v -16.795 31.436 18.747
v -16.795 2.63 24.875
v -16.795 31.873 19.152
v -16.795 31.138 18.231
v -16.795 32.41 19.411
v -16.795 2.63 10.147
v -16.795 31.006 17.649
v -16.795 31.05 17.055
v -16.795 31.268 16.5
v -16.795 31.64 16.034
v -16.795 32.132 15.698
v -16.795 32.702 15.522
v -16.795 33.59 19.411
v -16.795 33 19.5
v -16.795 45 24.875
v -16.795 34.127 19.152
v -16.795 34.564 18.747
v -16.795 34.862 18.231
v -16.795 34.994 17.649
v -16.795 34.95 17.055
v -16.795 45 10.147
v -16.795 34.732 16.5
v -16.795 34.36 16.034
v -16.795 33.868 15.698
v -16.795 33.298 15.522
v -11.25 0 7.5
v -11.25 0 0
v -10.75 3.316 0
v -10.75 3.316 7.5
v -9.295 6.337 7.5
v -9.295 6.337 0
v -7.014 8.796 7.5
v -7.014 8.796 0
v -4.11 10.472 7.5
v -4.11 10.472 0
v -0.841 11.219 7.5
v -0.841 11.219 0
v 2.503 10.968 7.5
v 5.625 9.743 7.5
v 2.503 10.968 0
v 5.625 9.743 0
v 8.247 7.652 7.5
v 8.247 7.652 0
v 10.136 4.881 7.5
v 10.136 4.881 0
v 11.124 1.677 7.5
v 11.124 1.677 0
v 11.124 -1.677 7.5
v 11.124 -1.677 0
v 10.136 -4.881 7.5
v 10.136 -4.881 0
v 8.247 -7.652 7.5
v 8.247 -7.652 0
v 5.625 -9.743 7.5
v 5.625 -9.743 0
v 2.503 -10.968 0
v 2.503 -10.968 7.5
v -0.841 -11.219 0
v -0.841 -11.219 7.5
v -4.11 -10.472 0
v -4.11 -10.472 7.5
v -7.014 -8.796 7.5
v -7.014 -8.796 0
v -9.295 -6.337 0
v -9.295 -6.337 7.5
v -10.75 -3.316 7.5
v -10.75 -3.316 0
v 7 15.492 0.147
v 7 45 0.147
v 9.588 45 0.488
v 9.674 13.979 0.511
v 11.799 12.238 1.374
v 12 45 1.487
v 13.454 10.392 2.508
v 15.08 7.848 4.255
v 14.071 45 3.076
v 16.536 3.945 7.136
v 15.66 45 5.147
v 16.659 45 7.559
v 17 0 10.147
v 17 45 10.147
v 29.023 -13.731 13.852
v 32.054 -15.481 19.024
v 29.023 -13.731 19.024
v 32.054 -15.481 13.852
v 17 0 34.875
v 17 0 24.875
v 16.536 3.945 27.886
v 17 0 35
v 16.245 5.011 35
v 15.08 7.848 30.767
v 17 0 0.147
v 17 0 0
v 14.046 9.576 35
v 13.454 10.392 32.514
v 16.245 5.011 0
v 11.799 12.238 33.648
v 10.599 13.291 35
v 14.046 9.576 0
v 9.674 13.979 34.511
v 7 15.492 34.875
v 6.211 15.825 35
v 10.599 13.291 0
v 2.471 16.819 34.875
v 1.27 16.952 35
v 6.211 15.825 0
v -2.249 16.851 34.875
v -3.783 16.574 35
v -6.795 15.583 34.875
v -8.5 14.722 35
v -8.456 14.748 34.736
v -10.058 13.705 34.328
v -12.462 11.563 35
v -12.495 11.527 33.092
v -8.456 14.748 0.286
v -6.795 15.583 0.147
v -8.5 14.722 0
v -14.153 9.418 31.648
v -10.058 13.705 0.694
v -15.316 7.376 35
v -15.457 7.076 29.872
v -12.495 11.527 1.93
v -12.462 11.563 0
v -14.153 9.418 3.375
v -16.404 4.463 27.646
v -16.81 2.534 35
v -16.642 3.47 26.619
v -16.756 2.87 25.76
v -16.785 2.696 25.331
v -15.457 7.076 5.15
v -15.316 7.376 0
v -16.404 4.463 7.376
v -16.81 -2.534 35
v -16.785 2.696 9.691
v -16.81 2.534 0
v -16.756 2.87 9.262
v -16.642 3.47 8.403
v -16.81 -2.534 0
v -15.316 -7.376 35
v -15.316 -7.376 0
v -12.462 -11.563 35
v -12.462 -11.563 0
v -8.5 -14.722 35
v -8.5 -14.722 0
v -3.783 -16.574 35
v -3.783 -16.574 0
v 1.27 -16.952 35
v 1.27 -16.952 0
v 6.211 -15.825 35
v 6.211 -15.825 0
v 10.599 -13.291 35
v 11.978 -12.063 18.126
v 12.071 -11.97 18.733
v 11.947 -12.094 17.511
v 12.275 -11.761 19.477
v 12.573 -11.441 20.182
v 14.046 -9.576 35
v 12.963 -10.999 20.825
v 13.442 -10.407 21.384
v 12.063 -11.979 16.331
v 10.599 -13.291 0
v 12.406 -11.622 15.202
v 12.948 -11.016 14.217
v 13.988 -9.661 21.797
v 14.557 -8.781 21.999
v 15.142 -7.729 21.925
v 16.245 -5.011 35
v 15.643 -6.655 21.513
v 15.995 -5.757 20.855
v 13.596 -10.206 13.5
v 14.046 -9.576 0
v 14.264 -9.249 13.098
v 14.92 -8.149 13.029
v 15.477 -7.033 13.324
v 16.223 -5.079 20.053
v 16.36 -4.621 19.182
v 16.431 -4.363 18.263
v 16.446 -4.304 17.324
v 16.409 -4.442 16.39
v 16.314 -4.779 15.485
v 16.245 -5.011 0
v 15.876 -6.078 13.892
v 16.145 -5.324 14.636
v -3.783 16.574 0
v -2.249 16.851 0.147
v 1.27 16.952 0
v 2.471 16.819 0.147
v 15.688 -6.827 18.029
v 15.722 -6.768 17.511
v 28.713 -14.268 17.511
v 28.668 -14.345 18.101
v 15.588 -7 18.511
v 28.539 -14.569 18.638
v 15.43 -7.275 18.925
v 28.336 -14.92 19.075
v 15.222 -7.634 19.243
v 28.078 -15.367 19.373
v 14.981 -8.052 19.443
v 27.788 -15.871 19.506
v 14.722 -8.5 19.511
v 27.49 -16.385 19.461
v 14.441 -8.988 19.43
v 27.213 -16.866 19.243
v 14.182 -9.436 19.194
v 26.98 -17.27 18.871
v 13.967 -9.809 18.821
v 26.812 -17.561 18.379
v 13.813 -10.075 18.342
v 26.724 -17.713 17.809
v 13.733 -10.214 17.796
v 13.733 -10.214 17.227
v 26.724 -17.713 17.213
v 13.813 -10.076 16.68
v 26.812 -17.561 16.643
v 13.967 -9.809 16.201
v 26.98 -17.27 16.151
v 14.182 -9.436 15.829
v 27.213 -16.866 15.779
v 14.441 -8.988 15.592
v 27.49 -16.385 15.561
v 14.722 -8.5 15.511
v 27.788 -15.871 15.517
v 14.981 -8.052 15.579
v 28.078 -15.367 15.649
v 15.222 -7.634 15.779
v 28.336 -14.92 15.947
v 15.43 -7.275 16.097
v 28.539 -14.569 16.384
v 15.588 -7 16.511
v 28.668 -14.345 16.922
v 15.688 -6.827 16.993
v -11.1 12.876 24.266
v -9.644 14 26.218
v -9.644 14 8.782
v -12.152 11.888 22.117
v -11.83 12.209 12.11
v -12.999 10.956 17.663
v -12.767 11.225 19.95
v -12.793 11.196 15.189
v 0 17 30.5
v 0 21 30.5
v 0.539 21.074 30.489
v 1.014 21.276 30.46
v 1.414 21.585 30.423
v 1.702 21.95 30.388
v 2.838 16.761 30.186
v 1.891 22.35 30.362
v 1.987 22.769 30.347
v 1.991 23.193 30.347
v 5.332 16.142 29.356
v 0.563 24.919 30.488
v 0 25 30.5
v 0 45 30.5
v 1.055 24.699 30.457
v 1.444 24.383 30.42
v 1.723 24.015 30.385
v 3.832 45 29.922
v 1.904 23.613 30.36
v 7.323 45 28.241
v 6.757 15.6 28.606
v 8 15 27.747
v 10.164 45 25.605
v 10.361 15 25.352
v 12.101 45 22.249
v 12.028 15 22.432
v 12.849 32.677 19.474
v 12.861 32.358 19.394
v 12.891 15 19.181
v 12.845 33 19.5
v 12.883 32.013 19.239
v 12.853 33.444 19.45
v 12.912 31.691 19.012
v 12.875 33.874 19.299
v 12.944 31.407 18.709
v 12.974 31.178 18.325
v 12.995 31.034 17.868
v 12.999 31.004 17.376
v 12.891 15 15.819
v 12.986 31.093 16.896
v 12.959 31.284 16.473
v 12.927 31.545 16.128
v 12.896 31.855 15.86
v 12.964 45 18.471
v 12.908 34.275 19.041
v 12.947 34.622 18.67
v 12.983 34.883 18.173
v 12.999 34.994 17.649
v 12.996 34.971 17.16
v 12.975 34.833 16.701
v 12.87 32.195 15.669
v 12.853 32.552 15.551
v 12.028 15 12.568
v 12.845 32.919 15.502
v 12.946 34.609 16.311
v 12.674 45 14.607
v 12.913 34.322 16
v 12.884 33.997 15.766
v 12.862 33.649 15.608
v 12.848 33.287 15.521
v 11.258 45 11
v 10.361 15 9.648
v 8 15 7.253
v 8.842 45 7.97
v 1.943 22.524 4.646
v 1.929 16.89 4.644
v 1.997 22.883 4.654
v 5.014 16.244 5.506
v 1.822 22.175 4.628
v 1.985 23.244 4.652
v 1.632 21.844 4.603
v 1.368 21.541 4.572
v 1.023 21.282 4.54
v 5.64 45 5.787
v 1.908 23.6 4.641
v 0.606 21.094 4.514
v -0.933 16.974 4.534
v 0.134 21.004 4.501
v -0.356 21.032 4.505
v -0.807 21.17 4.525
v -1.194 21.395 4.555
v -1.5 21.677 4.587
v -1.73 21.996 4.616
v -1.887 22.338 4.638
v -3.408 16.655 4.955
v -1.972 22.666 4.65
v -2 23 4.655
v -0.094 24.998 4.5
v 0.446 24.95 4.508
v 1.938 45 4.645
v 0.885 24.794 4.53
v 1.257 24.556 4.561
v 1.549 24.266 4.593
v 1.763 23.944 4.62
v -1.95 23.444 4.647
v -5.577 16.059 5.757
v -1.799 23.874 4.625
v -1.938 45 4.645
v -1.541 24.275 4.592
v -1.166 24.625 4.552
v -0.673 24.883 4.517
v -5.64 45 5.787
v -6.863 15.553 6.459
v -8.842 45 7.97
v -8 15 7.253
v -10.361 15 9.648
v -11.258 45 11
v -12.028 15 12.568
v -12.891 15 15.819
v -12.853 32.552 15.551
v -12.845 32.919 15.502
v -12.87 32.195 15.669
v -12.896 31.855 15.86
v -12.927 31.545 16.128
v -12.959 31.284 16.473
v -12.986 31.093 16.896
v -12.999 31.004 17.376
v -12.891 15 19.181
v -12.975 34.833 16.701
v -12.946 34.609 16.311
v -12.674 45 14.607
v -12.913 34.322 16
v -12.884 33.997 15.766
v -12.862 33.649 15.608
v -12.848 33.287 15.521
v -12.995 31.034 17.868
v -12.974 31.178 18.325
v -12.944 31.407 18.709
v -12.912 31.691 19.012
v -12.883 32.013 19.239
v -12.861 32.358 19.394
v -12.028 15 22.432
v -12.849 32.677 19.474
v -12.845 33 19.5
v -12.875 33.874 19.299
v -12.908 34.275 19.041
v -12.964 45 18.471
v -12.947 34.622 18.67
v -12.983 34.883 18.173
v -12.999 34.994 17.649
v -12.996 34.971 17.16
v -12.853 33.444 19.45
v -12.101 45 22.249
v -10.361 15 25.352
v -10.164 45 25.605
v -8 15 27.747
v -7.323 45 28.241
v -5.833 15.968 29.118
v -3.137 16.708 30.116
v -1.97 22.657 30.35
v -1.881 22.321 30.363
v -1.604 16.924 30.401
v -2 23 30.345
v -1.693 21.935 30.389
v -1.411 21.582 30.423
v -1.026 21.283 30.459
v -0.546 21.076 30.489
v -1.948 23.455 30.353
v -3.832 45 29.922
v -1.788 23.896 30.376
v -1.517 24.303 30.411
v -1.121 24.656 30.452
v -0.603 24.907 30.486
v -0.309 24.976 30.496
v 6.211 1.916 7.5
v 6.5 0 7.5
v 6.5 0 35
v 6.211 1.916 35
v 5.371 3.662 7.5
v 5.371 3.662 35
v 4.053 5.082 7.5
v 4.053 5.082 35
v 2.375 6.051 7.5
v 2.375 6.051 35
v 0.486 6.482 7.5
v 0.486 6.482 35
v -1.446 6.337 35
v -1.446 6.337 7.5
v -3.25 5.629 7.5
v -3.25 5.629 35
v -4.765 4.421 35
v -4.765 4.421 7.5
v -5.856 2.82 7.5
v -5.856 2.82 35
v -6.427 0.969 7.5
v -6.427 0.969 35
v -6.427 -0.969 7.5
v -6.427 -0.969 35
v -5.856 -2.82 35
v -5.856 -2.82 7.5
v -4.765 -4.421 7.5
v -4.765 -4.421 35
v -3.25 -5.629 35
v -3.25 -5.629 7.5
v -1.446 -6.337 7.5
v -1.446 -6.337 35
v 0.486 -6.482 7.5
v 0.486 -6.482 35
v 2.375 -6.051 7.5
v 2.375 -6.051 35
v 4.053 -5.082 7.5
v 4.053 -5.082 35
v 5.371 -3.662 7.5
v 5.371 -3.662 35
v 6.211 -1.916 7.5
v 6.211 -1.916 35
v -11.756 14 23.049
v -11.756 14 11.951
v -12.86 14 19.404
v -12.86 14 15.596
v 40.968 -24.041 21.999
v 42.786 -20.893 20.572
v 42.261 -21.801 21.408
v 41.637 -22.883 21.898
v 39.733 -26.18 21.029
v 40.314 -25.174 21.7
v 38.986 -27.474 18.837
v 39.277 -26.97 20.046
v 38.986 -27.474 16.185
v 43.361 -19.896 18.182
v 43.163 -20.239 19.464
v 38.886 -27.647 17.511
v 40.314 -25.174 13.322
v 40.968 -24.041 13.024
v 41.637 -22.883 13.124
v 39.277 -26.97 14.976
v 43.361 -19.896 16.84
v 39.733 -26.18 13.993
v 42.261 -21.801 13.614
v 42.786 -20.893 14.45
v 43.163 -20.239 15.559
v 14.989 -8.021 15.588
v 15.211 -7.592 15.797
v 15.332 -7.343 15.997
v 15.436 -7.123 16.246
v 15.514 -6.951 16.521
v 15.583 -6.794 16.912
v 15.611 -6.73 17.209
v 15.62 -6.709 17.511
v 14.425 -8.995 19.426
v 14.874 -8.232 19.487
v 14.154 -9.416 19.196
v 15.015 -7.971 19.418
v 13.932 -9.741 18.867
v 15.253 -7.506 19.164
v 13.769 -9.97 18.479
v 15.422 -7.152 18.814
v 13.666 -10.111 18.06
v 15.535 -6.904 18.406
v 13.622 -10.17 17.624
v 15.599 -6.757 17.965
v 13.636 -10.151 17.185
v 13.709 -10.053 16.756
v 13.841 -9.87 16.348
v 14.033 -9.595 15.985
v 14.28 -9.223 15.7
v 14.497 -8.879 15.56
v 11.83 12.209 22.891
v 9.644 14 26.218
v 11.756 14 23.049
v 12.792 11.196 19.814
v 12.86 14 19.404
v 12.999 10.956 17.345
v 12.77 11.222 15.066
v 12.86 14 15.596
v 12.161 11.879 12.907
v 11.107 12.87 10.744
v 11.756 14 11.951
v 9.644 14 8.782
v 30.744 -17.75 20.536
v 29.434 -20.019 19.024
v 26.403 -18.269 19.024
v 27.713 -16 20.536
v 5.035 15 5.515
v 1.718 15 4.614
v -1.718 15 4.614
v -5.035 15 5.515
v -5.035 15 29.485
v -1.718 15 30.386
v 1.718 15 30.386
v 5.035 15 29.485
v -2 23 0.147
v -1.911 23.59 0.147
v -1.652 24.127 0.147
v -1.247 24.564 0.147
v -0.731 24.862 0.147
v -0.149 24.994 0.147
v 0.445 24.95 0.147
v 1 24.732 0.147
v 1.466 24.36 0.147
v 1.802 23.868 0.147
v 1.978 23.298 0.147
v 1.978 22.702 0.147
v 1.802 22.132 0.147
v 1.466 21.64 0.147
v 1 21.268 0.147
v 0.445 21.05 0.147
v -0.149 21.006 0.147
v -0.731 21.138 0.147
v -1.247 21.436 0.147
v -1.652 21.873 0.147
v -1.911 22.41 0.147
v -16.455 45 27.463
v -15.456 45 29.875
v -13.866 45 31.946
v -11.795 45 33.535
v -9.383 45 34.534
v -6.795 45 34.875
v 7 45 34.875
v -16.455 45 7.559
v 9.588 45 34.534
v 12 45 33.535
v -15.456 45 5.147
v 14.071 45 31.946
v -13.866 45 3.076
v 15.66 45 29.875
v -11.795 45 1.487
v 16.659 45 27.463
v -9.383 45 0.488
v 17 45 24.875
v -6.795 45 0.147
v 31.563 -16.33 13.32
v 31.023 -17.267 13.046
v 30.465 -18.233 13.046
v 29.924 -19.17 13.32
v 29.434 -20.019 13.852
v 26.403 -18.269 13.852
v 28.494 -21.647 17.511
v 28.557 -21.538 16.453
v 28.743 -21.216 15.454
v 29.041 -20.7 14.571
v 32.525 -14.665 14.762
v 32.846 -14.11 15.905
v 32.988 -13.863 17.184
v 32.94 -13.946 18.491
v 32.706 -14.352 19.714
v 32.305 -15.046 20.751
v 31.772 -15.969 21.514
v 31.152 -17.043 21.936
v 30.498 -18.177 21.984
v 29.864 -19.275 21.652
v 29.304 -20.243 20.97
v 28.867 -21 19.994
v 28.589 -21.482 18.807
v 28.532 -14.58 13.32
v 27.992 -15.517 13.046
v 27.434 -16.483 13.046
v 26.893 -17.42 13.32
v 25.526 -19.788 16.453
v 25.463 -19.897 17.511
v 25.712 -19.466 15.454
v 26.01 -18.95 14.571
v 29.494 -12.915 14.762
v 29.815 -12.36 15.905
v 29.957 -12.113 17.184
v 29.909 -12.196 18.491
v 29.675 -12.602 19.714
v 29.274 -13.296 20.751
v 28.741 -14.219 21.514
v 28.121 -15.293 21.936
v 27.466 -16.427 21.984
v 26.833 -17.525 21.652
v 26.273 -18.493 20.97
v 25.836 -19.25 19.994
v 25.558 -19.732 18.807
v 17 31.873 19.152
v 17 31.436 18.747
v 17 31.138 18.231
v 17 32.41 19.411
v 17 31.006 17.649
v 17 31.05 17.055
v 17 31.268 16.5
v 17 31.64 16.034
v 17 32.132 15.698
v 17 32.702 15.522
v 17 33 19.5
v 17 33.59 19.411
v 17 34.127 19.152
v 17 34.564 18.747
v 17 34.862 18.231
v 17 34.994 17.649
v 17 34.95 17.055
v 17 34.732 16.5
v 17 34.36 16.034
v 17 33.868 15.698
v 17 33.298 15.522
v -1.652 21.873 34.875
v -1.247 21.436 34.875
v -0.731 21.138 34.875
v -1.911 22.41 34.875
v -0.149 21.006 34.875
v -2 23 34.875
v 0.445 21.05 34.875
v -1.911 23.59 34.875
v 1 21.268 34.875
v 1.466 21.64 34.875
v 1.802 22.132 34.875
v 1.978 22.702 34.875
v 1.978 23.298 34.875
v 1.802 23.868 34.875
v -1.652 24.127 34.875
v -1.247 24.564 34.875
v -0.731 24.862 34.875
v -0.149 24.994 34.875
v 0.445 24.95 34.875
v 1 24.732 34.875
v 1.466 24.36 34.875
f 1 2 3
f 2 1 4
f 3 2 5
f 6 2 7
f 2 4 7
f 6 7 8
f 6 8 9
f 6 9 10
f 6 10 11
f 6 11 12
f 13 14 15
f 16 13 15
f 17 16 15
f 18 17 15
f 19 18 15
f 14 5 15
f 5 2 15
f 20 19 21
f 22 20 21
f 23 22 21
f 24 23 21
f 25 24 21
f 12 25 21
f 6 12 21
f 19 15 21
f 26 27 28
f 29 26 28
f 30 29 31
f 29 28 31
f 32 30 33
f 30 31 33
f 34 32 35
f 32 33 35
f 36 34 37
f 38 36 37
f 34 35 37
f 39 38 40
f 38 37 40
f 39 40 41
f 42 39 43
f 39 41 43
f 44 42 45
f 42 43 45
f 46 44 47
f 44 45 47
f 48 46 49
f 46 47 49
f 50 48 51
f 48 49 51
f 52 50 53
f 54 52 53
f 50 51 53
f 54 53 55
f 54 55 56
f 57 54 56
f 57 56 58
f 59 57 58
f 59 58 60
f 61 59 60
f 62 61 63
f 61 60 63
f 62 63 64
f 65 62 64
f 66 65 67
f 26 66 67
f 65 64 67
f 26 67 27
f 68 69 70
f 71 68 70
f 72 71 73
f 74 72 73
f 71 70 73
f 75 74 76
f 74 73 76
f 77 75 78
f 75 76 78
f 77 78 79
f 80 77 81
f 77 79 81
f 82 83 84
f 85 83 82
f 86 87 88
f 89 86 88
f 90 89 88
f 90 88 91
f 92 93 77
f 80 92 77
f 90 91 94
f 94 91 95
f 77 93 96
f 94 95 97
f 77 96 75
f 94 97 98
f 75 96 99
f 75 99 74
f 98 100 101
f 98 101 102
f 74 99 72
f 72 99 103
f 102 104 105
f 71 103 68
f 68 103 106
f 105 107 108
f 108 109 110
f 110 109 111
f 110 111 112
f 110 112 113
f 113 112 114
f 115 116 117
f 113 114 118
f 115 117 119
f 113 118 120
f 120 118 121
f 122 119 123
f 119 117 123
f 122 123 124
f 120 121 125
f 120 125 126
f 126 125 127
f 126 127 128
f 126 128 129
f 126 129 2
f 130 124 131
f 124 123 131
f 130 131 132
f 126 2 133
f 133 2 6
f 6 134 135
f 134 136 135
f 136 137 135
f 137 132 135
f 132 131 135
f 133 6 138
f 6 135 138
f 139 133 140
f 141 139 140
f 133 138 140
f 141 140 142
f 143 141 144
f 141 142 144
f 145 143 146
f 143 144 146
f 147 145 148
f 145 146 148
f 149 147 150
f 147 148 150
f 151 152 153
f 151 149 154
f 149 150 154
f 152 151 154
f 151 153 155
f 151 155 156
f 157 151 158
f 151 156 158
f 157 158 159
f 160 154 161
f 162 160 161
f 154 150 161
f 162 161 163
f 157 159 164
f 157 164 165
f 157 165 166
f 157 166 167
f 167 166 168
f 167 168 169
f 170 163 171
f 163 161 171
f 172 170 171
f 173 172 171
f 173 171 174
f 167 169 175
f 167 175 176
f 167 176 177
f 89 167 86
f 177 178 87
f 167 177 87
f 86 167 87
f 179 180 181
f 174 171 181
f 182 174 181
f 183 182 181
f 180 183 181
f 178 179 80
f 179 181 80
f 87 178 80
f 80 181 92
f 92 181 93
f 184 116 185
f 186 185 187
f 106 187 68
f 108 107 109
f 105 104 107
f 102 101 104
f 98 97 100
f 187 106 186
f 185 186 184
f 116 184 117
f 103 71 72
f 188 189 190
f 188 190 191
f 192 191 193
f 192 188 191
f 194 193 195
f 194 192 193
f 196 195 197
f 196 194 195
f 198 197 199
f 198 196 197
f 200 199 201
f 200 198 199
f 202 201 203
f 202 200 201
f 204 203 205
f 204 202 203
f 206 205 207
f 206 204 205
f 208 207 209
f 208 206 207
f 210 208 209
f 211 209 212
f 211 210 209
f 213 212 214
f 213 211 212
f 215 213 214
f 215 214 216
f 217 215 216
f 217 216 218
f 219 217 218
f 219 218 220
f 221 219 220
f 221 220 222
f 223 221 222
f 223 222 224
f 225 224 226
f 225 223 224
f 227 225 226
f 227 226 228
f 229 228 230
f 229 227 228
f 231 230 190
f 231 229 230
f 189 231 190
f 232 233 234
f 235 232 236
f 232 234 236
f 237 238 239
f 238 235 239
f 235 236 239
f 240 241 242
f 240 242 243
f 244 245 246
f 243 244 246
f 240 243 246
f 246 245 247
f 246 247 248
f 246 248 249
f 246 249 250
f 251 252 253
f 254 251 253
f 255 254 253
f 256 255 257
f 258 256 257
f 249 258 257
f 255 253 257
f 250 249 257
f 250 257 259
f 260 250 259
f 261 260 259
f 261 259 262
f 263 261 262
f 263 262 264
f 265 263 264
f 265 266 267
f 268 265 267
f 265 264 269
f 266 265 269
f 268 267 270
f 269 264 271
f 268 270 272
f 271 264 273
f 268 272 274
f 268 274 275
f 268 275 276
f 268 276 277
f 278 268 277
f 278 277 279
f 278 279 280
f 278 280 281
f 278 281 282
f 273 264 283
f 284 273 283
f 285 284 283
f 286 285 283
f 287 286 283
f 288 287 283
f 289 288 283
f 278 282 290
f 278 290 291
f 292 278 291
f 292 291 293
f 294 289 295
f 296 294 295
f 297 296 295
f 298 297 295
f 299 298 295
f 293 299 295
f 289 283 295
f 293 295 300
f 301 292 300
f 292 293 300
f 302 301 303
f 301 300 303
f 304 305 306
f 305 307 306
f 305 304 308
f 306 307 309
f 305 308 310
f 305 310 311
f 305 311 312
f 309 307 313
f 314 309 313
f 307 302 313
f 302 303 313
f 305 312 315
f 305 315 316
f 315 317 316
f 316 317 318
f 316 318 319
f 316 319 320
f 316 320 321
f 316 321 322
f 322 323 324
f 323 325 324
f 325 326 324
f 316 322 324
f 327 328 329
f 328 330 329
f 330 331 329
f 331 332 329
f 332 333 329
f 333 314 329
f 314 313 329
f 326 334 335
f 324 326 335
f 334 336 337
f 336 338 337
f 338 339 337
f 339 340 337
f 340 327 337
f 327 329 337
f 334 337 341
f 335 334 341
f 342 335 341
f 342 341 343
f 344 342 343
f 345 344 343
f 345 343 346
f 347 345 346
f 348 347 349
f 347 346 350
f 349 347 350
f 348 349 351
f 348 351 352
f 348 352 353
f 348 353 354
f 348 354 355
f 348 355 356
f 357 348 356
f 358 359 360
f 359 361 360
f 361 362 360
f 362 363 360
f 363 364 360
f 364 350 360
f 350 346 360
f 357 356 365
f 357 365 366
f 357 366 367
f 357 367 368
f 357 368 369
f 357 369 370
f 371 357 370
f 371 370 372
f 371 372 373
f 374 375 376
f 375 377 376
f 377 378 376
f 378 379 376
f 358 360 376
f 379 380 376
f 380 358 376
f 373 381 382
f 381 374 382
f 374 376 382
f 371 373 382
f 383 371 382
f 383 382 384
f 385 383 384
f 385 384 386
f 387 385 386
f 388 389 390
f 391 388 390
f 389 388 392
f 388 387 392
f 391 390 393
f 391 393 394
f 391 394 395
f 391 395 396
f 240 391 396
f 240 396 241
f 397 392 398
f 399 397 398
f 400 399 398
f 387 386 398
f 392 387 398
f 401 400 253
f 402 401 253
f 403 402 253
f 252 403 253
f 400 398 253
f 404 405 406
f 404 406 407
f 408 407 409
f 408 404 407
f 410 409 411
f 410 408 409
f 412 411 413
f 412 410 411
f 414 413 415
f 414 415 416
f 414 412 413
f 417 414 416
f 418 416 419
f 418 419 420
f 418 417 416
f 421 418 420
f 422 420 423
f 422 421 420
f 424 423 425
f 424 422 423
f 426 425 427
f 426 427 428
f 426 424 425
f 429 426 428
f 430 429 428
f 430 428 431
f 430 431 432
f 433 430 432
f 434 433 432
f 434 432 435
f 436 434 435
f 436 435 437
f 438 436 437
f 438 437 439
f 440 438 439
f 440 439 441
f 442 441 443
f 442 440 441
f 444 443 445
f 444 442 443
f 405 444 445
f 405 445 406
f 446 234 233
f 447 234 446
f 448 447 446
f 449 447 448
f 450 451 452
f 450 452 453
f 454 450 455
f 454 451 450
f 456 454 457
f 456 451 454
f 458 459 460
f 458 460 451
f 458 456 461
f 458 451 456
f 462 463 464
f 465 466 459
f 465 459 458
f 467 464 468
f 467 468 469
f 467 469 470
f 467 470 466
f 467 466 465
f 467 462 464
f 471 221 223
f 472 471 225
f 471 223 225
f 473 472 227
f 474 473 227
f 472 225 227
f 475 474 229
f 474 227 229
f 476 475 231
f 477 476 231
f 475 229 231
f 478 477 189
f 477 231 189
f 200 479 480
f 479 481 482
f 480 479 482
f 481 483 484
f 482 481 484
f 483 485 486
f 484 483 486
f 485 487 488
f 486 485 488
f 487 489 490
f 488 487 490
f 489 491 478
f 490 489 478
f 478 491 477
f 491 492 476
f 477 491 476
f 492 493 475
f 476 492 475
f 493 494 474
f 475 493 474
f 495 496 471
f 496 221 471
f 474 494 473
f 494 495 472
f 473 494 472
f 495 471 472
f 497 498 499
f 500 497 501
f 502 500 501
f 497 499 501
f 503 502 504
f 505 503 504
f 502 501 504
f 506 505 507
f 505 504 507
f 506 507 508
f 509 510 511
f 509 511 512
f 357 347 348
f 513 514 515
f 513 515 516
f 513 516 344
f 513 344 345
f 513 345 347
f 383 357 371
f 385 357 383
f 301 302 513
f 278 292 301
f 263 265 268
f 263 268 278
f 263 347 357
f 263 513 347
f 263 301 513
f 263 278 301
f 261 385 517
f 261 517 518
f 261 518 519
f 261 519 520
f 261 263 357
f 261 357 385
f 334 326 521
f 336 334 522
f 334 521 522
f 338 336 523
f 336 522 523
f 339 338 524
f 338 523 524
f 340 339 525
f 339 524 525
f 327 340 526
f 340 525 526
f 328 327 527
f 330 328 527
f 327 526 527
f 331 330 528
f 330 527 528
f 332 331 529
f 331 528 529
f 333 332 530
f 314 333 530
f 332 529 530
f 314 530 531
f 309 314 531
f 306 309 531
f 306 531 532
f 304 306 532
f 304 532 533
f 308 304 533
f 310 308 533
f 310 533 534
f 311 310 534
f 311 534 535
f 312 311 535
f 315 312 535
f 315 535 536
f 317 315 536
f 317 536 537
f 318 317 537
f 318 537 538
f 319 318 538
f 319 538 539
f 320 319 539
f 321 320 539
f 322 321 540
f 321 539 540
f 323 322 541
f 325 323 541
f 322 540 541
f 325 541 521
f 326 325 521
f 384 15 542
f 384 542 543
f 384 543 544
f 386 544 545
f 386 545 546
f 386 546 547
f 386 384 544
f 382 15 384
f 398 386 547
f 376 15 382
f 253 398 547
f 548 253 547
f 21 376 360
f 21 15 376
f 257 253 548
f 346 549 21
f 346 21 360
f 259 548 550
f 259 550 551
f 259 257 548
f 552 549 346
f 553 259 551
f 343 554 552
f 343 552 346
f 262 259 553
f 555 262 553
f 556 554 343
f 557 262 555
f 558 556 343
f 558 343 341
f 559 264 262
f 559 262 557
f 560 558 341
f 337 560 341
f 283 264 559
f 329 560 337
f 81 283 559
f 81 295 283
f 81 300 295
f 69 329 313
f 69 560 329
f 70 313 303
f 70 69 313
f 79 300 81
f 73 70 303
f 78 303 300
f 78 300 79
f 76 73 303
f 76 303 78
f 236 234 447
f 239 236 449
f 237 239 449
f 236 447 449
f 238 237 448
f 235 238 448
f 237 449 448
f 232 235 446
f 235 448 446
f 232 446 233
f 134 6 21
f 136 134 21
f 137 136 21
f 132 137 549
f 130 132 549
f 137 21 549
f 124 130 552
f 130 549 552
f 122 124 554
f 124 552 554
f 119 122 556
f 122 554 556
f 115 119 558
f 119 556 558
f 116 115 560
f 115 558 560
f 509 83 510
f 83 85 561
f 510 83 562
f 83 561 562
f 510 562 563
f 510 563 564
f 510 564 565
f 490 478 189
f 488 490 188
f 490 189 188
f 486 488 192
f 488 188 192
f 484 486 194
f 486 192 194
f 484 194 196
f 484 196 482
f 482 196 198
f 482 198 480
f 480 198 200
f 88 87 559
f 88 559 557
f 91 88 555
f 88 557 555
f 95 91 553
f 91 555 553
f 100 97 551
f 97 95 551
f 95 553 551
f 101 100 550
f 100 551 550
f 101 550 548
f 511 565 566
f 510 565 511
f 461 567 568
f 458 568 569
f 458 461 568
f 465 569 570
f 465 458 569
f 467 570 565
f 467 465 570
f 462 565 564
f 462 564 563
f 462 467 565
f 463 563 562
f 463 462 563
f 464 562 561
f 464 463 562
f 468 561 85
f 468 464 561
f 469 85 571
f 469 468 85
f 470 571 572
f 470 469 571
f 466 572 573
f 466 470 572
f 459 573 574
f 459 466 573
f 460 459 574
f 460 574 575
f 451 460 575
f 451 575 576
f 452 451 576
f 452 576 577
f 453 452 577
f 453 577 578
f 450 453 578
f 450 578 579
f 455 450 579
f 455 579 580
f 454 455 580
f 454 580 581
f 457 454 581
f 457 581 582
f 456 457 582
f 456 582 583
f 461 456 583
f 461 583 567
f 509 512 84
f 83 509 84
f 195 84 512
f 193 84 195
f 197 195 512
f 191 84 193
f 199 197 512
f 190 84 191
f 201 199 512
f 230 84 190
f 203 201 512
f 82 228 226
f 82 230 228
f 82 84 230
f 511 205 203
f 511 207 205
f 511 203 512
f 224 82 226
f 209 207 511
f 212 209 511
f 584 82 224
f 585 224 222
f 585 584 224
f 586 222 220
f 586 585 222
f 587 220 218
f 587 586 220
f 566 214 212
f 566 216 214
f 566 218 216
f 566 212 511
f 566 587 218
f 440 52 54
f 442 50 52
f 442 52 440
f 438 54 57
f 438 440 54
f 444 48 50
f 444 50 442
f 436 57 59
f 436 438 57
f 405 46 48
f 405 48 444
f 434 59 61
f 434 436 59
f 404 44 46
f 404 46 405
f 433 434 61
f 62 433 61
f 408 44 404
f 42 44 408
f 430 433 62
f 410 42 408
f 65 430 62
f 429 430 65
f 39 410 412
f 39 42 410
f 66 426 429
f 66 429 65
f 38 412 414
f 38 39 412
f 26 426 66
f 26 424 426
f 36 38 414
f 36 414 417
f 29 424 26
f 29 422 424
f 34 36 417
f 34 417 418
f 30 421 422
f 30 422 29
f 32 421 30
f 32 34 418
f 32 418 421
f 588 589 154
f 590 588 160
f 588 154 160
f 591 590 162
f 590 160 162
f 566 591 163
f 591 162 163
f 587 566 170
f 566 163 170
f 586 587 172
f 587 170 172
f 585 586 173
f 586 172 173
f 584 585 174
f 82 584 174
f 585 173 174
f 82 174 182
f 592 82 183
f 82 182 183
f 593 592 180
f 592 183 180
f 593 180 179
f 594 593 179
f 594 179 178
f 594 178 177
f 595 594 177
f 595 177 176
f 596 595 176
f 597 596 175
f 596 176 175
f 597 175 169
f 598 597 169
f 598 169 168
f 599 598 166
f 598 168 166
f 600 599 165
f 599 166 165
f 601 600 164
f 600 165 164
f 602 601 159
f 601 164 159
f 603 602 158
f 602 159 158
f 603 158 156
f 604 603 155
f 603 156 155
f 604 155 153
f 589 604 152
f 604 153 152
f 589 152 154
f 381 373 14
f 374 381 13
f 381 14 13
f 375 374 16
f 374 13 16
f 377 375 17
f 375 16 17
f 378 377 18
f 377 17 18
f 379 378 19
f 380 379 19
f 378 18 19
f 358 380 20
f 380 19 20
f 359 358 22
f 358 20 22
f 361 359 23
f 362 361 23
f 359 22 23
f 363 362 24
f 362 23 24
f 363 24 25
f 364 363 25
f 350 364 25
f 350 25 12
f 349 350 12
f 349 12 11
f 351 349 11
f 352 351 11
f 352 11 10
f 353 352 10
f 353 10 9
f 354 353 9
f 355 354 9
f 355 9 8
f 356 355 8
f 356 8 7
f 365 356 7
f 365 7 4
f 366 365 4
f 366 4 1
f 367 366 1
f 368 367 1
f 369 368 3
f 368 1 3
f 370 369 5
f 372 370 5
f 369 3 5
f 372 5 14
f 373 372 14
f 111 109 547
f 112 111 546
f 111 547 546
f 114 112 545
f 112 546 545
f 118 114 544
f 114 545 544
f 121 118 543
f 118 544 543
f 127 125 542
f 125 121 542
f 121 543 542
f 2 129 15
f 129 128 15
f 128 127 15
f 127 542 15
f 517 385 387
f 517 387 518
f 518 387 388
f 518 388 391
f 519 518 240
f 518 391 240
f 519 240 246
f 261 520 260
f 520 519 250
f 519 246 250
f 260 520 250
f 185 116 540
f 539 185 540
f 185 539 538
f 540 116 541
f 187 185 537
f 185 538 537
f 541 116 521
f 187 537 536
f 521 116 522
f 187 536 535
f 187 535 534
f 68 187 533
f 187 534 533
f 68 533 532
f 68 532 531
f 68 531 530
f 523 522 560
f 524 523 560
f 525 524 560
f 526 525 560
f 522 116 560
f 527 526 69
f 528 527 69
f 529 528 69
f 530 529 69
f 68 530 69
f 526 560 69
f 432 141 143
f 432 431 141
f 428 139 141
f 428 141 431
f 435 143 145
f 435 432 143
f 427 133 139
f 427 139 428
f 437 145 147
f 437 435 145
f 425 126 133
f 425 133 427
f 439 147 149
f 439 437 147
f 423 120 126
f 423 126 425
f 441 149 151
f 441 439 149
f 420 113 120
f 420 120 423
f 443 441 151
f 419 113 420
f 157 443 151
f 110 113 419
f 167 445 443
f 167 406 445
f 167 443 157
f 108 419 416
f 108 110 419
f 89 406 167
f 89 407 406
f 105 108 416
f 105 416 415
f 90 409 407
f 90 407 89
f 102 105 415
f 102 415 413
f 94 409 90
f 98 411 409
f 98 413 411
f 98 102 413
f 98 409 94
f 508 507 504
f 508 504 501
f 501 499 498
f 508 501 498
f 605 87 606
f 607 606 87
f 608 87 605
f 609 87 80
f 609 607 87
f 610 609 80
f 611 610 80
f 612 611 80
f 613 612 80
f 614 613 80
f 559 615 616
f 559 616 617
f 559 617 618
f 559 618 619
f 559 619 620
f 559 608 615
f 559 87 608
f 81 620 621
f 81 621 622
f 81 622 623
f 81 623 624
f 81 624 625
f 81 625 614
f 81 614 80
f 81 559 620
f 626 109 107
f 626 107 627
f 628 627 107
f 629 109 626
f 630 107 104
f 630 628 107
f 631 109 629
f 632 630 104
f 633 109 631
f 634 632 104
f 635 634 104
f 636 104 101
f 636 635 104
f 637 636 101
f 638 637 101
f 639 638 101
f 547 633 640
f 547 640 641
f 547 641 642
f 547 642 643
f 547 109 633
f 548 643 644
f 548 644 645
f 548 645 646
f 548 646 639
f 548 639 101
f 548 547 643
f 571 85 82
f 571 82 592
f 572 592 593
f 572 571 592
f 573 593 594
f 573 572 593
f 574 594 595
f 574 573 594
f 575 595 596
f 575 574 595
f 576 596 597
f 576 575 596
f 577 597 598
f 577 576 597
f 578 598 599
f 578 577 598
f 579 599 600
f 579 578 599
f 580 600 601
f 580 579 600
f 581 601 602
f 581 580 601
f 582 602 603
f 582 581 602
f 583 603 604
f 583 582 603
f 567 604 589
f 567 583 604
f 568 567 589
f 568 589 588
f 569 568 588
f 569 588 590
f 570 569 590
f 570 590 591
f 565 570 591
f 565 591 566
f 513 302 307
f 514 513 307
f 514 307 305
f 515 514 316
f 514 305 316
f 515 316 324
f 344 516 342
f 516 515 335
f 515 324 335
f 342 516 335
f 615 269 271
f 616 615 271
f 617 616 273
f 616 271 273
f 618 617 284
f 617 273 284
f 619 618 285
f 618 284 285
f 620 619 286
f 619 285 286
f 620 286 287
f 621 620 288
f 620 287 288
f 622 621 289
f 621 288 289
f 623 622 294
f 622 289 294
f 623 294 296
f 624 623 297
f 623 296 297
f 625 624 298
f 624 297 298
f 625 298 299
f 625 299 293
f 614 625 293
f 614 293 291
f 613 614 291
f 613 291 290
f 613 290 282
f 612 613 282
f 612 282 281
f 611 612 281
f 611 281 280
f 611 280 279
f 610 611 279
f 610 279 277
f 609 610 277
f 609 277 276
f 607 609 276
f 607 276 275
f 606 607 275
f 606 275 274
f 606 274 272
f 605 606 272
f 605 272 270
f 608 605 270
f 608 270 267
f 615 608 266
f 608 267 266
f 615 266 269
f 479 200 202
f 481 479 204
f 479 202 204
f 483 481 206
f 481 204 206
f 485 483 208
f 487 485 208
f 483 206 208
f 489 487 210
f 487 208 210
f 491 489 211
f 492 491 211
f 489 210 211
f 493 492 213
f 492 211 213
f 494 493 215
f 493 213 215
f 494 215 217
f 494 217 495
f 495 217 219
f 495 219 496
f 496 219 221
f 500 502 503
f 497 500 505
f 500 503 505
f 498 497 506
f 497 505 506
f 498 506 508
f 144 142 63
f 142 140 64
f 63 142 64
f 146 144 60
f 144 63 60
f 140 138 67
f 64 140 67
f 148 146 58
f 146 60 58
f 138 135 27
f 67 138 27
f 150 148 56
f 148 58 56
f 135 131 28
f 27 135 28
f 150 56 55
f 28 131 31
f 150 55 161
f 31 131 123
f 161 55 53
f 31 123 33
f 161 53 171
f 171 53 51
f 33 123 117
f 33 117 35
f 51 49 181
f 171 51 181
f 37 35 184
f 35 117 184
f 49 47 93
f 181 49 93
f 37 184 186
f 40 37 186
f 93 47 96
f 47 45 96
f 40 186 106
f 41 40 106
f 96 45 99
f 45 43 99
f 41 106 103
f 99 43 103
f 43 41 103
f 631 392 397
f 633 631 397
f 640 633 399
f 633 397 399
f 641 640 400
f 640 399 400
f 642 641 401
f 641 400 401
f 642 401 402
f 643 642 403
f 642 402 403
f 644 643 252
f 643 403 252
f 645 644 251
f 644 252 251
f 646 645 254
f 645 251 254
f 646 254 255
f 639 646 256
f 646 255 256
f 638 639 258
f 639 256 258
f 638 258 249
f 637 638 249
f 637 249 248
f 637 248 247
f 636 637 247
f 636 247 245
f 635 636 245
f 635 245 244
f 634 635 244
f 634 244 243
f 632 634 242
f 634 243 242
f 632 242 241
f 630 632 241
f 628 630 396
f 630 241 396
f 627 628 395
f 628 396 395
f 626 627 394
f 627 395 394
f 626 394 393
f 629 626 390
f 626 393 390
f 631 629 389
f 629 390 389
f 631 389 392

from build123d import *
from build123d.topology import SkipClean

# Parameters (mm, degrees)
SKETCH_1_R                        = 17
SKETCH_1_R_2                      = 6.5
EXTRUDE_2_DEPTH                   = 35
SKETCH_3_W                        = 33.795275063
SKETCH_3_H                        = 34.72803434
SKETCH_3_R                        = 13
EXTRUDE_7_DEPTH                   = 45
SKETCH_4_R                        = 6.5
CUT_EXTRUDE_1_DEPTH               = 60.489495005
SKETCH_12_R                       = 2
CUT_EXTRUDE_11_DEPTH              = 45
SKETCH_15_R                       = 2
CUT_EXTRUDE_12_DEPTH              = 45
FILLET_4_R                        = 10
SKETCH_20_R                       = 13
CUT_EXTRUDE_18_DEPTH              = 31
EXTRUDE_START                     = 1
SKETCH_25_R                       = 13
EXTRUDE_10_DEPTH                  = 1
SKETCH_26_R                       = 11.25
CUT_EXTRUDE_19_DEPTH              = 7.5
SKETCH_36_R                       = 4.5
SKETCH_36_R_2                     = 2
EXTRUDE_17_DEPTH                  = 15
EXTRUDE_17_DIRECTION_2_REACH      = 73.369
EXTRUDE_17_DIRECTION_2_END_RADIUS = 17
EXTRUDE_START_2                   = 3.5
EXTRUDE_18_DEPTH                  = 3.5
EXTRUDE_START_3                   = 12
SKETCH_41_R                       = 4.5
EXTRUDE_19_DEPTH                  = 12


with BuildPart() as part:
    # Эскиз1 → Бобышка-Вытянуть2 (new body)
    with BuildSketch(Plane.XY):
        Circle(SKETCH_1_R)
        Circle(SKETCH_1_R_2, mode=Mode.SUBTRACT)
    extrude(amount=EXTRUDE_2_DEPTH)

    # Эскиз3 → Бобышка-Вытянуть7 (add)
    with BuildSketch(Plane(origin=(0, 45, 0), x_dir=(1, 0, 0), z_dir=(0, 1, 0))):
        with Locations((0.102362468, -17.511098906)):
            Rectangle(SKETCH_3_W, SKETCH_3_H)
        with Locations(Location((0, -17.5, 0), (0, 0, 270))):
            Circle(SKETCH_3_R, mode=Mode.SUBTRACT)
    extrude(amount=-EXTRUDE_7_DEPTH)

    # Эскиз4 → Вырез-Вытянуть1 (cut, through all)
    with BuildSketch(Plane(origin=(0, 0, 0), x_dir=(-1, 0, 0), z_dir=(0, 0, -1))):
        with Locations(Location((0, 0, 0), (0, 0, 180))):
            Circle(SKETCH_4_R)
    extrude(amount=-CUT_EXTRUDE_1_DEPTH, mode=Mode.SUBTRACT)

    # Эскиз12 → Вырез-Вытянуть11 (cut)
    with BuildSketch(Plane(origin=(0, 0, 0), x_dir=(-1, 0, 0), z_dir=(0, 0, -1))):
        with Locations((0, 23)):
            Circle(SKETCH_12_R)
    extrude(amount=-CUT_EXTRUDE_11_DEPTH, mode=Mode.SUBTRACT)

    # Эскиз15 → Вырез-Вытянуть12 (cut)
    with BuildSketch(Plane.ZY.offset(16.795275063)):
        with Locations((17.5, 33)):
            Circle(SKETCH_15_R)
    extrude(amount=-CUT_EXTRUDE_12_DEPTH, mode=Mode.SUBTRACT)

    # Скругление4
    # the kernel refuses this fillet: 10 mm, written as the material it takes off along each edge
    with BuildSketch(Plane(origin=(-16.795275063, 70, 34.875116076), x_dir=(1, 0, 0), z_dir=(0, -1, 0))) as fillet_4_piece_1_section:
        with BuildLine():
            CenterArc((FILLET_4_R, -FILLET_4_R), FILLET_4_R, 90, 90)
            Line((0, -FILLET_4_R), (0, 0))
            Line((0, 0), (FILLET_4_R, 0))
        make_face()
    fillet_4_piece_1 = extrude(amount=92.369651061, mode=Mode.PRIVATE)
    fillet_4_piece_1 = fillet_4_piece_1 - Plane(origin=(0, 0, 32.54483178), x_dir=(1, 0, 0), z_dir=(0, 0, -1)) * Cylinder(17, 225, mode=Mode.PRIVATE)
    add(fillet_4_piece_1, mode=Mode.SUBTRACT)
    with BuildSketch(Plane(origin=(17, 70, 0.147081736), x_dir=(0, 0, 1), z_dir=(0, -1, 0))) as fillet_4_piece_2_section:
        with BuildLine():
            CenterArc((FILLET_4_R, FILLET_4_R), FILLET_4_R, 180, 90)
            Line((0, FILLET_4_R), (0, 0))
            Line((0, 0), (FILLET_4_R, 0))
        make_face()
    fillet_4_piece_2 = extrude(amount=95, mode=Mode.PRIVATE)
    fillet_4_piece_2 = fillet_4_piece_2 - Plane(origin=(0, 0, 2.486350956), x_dir=(1, 0, 0), z_dir=(0, 0, -1)) * Cylinder(17, 230, mode=Mode.PRIVATE)
    add(fillet_4_piece_2, mode=Mode.SUBTRACT)
    with BuildSketch(Plane(origin=(17, 70, 34.875116076), x_dir=(0, 0, -1), z_dir=(0, -1, 0))) as fillet_4_piece_3_section:
        with BuildLine():
            CenterArc((FILLET_4_R, -FILLET_4_R), FILLET_4_R, 90, 90)
            Line((0, -FILLET_4_R), (0, 0))
            Line((0, 0), (FILLET_4_R, 0))
        make_face()
    fillet_4_piece_3 = extrude(amount=95, mode=Mode.PRIVATE)
    fillet_4_piece_3 = fillet_4_piece_3 - Plane(origin=(0, 0, 32.535846855), x_dir=(1, 0, 0), z_dir=(0, 0, -1)) * Cylinder(17, 230, mode=Mode.PRIVATE)
    add(fillet_4_piece_3, mode=Mode.SUBTRACT)
    with BuildSketch(Plane(origin=(-16.795275063, 70, 0.147081736), x_dir=(0, 0, 1), z_dir=(0, -1, 0))) as fillet_4_piece_4_section:
        with BuildLine():
            CenterArc((FILLET_4_R, -FILLET_4_R), FILLET_4_R, 90, 90)
            Line((0, -FILLET_4_R), (0, 0))
            Line((0, 0), (FILLET_4_R, 0))
        make_face()
    fillet_4_piece_4 = extrude(amount=92.369651061, mode=Mode.PRIVATE)
    fillet_4_piece_4 = fillet_4_piece_4 - Plane(origin=(0, 0, 2.477367304), x_dir=(1, 0, 0), z_dir=(0, 0, -1)) * Cylinder(17, 225, mode=Mode.PRIVATE)
    add(fillet_4_piece_4, mode=Mode.SUBTRACT)

    # Эскиз20 → Вырез-Вытянуть18 (cut)
    with SkipClean():  # the faces are left unmerged after this step: merging them gives an invalid solid
        with BuildSketch(Plane(origin=(0, 45, 0), x_dir=(1, 0, 0), z_dir=(0, 1, 0))):
            with Locations(Location((0, -17.5, 0), (0, 0, 270))):
                Circle(SKETCH_20_R)
        extrude(amount=-CUT_EXTRUDE_18_DEPTH, mode=Mode.SUBTRACT)

    # Эскиз25 → Бобышка-Вытянуть10 (add)
    with BuildSketch(Plane(origin=(0, 14, 0), x_dir=(1, 0, 0), z_dir=(0, 1, 0)).offset(EXTRUDE_START)):
        with Locations(Location((0, -17.5, 0), (0, 0, 270))):
            Circle(SKETCH_25_R)
    extrude(amount=-EXTRUDE_10_DEPTH)

    # Эскиз26 → Вырез-Вытянуть19 (cut)
    with BuildSketch(Plane(origin=(0, 0, 0), x_dir=(-1, 0, 0), z_dir=(0, 0, -1))):
        Circle(SKETCH_26_R)
    extrude(amount=-CUT_EXTRUDE_19_DEPTH, mode=Mode.SUBTRACT)

    # Эскиз36 → Бобышка-Вытянуть17 (add)
    with BuildSketch(Plane(origin=(14.722431864, -8.5, 0), x_dir=(0, 0, -1), z_dir=(0.8660254037844346, -0.5000000000000071, 0))):
        with Locations(Location((-17.511098906, 0, 0), (0, 0, 270))):
            Circle(SKETCH_36_R)
        with Locations(Location((-17.511098906, 0, 0), (0, 0, 90))):
            Circle(SKETCH_36_R_2, mode=Mode.SUBTRACT)
    extrude(amount=EXTRUDE_17_DEPTH)

    # Бобышка-Вытянуть17 direction 2: up to this cylinder (the profile starts outside it)
    with SkipClean():  # the faces are left unmerged after this step: merging them gives an invalid solid
        extrude_17_direction_2_end = Plane(origin=(0, 0, 17.511099), z_dir=(0, 0, -1)) * Cylinder(EXTRUDE_17_DIRECTION_2_END_RADIUS, 181.738, mode=Mode.PRIVATE)
        # Эскиз36 → Бобышка-Вытянуть17 direction 2 (add, up to the surface)
        with BuildSketch(Plane(origin=(14.722431864, -8.5, 0), x_dir=(0, 0, -1), z_dir=(0.8660254037844346, -0.5000000000000071, 0)), mode=Mode.PRIVATE) as extrude_17_direction_2_sk1:
            with Locations(Location((-17.511098906, 0, 0), (0, 0, 270))):
                Circle(SKETCH_36_R)
            with Locations(Location((-17.511098906, 0, 0), (0, 0, 90))):
                Circle(SKETCH_36_R_2, mode=Mode.SUBTRACT)
        extrude_17_direction_2_tool1 = extrude(extrude_17_direction_2_sk1.sketch, amount=-EXTRUDE_17_DIRECTION_2_REACH, mode=Mode.PRIVATE) - extrude_17_direction_2_end
        add(extrude_17_direction_2_tool1.solids().sort_by_distance((16.908792, -4.713113, 17.511099))[0])
        add(extrude_17_direction_2_tool1.solids().sort_by_distance((16.908792, -4.713113, 17.511099))[1])

    # Эскиз40 → Бобышка-Вытянуть18 (add)
    with BuildSketch(Plane(origin=(27.712812921, -16, 0), x_dir=(0, 0, -1), z_dir=(0.8660254037844346, -0.5000000000000071, 0)).offset(EXTRUDE_START_2)):
        with BuildLine():
            Line((-15.998598906, 2.619726846), (-13.852269687, 2.619726846))
            ThreePointArc((-13.852269687, 2.619726846), (-22.011098906, 0), (-13.852269687, -2.619726846))
            Line((-13.852269687, -2.619726846), (-15.998598906, -2.619726846))
            Line((-15.998598906, -2.619726846), (-19.023598906, -2.619726846))
            Line((-19.023598906, -2.619726846), (-20.536098906, 0))
            Line((-20.536098906, 0), (-19.023598906, 2.619726846))
            Line((-19.023598906, 2.619726846), (-15.998598906, 2.619726846))
        make_face()
    extrude(amount=-EXTRUDE_18_DEPTH)

    # Эскиз41 → Бобышка-Вытянуть19 (add)
    with BuildSketch(Plane(origin=(30.743901834, -17.75, 0), x_dir=(0, 0, -1), z_dir=(0.8660254037844346, -0.5000000000000071, 0)).offset(EXTRUDE_START_3)):
        with Locations(Location((-17.511098906, 0, 0), (0, 0, 270))):
            Circle(SKETCH_41_R)
    extrude(amount=-EXTRUDE_19_DEPTH)


solid = part.part
